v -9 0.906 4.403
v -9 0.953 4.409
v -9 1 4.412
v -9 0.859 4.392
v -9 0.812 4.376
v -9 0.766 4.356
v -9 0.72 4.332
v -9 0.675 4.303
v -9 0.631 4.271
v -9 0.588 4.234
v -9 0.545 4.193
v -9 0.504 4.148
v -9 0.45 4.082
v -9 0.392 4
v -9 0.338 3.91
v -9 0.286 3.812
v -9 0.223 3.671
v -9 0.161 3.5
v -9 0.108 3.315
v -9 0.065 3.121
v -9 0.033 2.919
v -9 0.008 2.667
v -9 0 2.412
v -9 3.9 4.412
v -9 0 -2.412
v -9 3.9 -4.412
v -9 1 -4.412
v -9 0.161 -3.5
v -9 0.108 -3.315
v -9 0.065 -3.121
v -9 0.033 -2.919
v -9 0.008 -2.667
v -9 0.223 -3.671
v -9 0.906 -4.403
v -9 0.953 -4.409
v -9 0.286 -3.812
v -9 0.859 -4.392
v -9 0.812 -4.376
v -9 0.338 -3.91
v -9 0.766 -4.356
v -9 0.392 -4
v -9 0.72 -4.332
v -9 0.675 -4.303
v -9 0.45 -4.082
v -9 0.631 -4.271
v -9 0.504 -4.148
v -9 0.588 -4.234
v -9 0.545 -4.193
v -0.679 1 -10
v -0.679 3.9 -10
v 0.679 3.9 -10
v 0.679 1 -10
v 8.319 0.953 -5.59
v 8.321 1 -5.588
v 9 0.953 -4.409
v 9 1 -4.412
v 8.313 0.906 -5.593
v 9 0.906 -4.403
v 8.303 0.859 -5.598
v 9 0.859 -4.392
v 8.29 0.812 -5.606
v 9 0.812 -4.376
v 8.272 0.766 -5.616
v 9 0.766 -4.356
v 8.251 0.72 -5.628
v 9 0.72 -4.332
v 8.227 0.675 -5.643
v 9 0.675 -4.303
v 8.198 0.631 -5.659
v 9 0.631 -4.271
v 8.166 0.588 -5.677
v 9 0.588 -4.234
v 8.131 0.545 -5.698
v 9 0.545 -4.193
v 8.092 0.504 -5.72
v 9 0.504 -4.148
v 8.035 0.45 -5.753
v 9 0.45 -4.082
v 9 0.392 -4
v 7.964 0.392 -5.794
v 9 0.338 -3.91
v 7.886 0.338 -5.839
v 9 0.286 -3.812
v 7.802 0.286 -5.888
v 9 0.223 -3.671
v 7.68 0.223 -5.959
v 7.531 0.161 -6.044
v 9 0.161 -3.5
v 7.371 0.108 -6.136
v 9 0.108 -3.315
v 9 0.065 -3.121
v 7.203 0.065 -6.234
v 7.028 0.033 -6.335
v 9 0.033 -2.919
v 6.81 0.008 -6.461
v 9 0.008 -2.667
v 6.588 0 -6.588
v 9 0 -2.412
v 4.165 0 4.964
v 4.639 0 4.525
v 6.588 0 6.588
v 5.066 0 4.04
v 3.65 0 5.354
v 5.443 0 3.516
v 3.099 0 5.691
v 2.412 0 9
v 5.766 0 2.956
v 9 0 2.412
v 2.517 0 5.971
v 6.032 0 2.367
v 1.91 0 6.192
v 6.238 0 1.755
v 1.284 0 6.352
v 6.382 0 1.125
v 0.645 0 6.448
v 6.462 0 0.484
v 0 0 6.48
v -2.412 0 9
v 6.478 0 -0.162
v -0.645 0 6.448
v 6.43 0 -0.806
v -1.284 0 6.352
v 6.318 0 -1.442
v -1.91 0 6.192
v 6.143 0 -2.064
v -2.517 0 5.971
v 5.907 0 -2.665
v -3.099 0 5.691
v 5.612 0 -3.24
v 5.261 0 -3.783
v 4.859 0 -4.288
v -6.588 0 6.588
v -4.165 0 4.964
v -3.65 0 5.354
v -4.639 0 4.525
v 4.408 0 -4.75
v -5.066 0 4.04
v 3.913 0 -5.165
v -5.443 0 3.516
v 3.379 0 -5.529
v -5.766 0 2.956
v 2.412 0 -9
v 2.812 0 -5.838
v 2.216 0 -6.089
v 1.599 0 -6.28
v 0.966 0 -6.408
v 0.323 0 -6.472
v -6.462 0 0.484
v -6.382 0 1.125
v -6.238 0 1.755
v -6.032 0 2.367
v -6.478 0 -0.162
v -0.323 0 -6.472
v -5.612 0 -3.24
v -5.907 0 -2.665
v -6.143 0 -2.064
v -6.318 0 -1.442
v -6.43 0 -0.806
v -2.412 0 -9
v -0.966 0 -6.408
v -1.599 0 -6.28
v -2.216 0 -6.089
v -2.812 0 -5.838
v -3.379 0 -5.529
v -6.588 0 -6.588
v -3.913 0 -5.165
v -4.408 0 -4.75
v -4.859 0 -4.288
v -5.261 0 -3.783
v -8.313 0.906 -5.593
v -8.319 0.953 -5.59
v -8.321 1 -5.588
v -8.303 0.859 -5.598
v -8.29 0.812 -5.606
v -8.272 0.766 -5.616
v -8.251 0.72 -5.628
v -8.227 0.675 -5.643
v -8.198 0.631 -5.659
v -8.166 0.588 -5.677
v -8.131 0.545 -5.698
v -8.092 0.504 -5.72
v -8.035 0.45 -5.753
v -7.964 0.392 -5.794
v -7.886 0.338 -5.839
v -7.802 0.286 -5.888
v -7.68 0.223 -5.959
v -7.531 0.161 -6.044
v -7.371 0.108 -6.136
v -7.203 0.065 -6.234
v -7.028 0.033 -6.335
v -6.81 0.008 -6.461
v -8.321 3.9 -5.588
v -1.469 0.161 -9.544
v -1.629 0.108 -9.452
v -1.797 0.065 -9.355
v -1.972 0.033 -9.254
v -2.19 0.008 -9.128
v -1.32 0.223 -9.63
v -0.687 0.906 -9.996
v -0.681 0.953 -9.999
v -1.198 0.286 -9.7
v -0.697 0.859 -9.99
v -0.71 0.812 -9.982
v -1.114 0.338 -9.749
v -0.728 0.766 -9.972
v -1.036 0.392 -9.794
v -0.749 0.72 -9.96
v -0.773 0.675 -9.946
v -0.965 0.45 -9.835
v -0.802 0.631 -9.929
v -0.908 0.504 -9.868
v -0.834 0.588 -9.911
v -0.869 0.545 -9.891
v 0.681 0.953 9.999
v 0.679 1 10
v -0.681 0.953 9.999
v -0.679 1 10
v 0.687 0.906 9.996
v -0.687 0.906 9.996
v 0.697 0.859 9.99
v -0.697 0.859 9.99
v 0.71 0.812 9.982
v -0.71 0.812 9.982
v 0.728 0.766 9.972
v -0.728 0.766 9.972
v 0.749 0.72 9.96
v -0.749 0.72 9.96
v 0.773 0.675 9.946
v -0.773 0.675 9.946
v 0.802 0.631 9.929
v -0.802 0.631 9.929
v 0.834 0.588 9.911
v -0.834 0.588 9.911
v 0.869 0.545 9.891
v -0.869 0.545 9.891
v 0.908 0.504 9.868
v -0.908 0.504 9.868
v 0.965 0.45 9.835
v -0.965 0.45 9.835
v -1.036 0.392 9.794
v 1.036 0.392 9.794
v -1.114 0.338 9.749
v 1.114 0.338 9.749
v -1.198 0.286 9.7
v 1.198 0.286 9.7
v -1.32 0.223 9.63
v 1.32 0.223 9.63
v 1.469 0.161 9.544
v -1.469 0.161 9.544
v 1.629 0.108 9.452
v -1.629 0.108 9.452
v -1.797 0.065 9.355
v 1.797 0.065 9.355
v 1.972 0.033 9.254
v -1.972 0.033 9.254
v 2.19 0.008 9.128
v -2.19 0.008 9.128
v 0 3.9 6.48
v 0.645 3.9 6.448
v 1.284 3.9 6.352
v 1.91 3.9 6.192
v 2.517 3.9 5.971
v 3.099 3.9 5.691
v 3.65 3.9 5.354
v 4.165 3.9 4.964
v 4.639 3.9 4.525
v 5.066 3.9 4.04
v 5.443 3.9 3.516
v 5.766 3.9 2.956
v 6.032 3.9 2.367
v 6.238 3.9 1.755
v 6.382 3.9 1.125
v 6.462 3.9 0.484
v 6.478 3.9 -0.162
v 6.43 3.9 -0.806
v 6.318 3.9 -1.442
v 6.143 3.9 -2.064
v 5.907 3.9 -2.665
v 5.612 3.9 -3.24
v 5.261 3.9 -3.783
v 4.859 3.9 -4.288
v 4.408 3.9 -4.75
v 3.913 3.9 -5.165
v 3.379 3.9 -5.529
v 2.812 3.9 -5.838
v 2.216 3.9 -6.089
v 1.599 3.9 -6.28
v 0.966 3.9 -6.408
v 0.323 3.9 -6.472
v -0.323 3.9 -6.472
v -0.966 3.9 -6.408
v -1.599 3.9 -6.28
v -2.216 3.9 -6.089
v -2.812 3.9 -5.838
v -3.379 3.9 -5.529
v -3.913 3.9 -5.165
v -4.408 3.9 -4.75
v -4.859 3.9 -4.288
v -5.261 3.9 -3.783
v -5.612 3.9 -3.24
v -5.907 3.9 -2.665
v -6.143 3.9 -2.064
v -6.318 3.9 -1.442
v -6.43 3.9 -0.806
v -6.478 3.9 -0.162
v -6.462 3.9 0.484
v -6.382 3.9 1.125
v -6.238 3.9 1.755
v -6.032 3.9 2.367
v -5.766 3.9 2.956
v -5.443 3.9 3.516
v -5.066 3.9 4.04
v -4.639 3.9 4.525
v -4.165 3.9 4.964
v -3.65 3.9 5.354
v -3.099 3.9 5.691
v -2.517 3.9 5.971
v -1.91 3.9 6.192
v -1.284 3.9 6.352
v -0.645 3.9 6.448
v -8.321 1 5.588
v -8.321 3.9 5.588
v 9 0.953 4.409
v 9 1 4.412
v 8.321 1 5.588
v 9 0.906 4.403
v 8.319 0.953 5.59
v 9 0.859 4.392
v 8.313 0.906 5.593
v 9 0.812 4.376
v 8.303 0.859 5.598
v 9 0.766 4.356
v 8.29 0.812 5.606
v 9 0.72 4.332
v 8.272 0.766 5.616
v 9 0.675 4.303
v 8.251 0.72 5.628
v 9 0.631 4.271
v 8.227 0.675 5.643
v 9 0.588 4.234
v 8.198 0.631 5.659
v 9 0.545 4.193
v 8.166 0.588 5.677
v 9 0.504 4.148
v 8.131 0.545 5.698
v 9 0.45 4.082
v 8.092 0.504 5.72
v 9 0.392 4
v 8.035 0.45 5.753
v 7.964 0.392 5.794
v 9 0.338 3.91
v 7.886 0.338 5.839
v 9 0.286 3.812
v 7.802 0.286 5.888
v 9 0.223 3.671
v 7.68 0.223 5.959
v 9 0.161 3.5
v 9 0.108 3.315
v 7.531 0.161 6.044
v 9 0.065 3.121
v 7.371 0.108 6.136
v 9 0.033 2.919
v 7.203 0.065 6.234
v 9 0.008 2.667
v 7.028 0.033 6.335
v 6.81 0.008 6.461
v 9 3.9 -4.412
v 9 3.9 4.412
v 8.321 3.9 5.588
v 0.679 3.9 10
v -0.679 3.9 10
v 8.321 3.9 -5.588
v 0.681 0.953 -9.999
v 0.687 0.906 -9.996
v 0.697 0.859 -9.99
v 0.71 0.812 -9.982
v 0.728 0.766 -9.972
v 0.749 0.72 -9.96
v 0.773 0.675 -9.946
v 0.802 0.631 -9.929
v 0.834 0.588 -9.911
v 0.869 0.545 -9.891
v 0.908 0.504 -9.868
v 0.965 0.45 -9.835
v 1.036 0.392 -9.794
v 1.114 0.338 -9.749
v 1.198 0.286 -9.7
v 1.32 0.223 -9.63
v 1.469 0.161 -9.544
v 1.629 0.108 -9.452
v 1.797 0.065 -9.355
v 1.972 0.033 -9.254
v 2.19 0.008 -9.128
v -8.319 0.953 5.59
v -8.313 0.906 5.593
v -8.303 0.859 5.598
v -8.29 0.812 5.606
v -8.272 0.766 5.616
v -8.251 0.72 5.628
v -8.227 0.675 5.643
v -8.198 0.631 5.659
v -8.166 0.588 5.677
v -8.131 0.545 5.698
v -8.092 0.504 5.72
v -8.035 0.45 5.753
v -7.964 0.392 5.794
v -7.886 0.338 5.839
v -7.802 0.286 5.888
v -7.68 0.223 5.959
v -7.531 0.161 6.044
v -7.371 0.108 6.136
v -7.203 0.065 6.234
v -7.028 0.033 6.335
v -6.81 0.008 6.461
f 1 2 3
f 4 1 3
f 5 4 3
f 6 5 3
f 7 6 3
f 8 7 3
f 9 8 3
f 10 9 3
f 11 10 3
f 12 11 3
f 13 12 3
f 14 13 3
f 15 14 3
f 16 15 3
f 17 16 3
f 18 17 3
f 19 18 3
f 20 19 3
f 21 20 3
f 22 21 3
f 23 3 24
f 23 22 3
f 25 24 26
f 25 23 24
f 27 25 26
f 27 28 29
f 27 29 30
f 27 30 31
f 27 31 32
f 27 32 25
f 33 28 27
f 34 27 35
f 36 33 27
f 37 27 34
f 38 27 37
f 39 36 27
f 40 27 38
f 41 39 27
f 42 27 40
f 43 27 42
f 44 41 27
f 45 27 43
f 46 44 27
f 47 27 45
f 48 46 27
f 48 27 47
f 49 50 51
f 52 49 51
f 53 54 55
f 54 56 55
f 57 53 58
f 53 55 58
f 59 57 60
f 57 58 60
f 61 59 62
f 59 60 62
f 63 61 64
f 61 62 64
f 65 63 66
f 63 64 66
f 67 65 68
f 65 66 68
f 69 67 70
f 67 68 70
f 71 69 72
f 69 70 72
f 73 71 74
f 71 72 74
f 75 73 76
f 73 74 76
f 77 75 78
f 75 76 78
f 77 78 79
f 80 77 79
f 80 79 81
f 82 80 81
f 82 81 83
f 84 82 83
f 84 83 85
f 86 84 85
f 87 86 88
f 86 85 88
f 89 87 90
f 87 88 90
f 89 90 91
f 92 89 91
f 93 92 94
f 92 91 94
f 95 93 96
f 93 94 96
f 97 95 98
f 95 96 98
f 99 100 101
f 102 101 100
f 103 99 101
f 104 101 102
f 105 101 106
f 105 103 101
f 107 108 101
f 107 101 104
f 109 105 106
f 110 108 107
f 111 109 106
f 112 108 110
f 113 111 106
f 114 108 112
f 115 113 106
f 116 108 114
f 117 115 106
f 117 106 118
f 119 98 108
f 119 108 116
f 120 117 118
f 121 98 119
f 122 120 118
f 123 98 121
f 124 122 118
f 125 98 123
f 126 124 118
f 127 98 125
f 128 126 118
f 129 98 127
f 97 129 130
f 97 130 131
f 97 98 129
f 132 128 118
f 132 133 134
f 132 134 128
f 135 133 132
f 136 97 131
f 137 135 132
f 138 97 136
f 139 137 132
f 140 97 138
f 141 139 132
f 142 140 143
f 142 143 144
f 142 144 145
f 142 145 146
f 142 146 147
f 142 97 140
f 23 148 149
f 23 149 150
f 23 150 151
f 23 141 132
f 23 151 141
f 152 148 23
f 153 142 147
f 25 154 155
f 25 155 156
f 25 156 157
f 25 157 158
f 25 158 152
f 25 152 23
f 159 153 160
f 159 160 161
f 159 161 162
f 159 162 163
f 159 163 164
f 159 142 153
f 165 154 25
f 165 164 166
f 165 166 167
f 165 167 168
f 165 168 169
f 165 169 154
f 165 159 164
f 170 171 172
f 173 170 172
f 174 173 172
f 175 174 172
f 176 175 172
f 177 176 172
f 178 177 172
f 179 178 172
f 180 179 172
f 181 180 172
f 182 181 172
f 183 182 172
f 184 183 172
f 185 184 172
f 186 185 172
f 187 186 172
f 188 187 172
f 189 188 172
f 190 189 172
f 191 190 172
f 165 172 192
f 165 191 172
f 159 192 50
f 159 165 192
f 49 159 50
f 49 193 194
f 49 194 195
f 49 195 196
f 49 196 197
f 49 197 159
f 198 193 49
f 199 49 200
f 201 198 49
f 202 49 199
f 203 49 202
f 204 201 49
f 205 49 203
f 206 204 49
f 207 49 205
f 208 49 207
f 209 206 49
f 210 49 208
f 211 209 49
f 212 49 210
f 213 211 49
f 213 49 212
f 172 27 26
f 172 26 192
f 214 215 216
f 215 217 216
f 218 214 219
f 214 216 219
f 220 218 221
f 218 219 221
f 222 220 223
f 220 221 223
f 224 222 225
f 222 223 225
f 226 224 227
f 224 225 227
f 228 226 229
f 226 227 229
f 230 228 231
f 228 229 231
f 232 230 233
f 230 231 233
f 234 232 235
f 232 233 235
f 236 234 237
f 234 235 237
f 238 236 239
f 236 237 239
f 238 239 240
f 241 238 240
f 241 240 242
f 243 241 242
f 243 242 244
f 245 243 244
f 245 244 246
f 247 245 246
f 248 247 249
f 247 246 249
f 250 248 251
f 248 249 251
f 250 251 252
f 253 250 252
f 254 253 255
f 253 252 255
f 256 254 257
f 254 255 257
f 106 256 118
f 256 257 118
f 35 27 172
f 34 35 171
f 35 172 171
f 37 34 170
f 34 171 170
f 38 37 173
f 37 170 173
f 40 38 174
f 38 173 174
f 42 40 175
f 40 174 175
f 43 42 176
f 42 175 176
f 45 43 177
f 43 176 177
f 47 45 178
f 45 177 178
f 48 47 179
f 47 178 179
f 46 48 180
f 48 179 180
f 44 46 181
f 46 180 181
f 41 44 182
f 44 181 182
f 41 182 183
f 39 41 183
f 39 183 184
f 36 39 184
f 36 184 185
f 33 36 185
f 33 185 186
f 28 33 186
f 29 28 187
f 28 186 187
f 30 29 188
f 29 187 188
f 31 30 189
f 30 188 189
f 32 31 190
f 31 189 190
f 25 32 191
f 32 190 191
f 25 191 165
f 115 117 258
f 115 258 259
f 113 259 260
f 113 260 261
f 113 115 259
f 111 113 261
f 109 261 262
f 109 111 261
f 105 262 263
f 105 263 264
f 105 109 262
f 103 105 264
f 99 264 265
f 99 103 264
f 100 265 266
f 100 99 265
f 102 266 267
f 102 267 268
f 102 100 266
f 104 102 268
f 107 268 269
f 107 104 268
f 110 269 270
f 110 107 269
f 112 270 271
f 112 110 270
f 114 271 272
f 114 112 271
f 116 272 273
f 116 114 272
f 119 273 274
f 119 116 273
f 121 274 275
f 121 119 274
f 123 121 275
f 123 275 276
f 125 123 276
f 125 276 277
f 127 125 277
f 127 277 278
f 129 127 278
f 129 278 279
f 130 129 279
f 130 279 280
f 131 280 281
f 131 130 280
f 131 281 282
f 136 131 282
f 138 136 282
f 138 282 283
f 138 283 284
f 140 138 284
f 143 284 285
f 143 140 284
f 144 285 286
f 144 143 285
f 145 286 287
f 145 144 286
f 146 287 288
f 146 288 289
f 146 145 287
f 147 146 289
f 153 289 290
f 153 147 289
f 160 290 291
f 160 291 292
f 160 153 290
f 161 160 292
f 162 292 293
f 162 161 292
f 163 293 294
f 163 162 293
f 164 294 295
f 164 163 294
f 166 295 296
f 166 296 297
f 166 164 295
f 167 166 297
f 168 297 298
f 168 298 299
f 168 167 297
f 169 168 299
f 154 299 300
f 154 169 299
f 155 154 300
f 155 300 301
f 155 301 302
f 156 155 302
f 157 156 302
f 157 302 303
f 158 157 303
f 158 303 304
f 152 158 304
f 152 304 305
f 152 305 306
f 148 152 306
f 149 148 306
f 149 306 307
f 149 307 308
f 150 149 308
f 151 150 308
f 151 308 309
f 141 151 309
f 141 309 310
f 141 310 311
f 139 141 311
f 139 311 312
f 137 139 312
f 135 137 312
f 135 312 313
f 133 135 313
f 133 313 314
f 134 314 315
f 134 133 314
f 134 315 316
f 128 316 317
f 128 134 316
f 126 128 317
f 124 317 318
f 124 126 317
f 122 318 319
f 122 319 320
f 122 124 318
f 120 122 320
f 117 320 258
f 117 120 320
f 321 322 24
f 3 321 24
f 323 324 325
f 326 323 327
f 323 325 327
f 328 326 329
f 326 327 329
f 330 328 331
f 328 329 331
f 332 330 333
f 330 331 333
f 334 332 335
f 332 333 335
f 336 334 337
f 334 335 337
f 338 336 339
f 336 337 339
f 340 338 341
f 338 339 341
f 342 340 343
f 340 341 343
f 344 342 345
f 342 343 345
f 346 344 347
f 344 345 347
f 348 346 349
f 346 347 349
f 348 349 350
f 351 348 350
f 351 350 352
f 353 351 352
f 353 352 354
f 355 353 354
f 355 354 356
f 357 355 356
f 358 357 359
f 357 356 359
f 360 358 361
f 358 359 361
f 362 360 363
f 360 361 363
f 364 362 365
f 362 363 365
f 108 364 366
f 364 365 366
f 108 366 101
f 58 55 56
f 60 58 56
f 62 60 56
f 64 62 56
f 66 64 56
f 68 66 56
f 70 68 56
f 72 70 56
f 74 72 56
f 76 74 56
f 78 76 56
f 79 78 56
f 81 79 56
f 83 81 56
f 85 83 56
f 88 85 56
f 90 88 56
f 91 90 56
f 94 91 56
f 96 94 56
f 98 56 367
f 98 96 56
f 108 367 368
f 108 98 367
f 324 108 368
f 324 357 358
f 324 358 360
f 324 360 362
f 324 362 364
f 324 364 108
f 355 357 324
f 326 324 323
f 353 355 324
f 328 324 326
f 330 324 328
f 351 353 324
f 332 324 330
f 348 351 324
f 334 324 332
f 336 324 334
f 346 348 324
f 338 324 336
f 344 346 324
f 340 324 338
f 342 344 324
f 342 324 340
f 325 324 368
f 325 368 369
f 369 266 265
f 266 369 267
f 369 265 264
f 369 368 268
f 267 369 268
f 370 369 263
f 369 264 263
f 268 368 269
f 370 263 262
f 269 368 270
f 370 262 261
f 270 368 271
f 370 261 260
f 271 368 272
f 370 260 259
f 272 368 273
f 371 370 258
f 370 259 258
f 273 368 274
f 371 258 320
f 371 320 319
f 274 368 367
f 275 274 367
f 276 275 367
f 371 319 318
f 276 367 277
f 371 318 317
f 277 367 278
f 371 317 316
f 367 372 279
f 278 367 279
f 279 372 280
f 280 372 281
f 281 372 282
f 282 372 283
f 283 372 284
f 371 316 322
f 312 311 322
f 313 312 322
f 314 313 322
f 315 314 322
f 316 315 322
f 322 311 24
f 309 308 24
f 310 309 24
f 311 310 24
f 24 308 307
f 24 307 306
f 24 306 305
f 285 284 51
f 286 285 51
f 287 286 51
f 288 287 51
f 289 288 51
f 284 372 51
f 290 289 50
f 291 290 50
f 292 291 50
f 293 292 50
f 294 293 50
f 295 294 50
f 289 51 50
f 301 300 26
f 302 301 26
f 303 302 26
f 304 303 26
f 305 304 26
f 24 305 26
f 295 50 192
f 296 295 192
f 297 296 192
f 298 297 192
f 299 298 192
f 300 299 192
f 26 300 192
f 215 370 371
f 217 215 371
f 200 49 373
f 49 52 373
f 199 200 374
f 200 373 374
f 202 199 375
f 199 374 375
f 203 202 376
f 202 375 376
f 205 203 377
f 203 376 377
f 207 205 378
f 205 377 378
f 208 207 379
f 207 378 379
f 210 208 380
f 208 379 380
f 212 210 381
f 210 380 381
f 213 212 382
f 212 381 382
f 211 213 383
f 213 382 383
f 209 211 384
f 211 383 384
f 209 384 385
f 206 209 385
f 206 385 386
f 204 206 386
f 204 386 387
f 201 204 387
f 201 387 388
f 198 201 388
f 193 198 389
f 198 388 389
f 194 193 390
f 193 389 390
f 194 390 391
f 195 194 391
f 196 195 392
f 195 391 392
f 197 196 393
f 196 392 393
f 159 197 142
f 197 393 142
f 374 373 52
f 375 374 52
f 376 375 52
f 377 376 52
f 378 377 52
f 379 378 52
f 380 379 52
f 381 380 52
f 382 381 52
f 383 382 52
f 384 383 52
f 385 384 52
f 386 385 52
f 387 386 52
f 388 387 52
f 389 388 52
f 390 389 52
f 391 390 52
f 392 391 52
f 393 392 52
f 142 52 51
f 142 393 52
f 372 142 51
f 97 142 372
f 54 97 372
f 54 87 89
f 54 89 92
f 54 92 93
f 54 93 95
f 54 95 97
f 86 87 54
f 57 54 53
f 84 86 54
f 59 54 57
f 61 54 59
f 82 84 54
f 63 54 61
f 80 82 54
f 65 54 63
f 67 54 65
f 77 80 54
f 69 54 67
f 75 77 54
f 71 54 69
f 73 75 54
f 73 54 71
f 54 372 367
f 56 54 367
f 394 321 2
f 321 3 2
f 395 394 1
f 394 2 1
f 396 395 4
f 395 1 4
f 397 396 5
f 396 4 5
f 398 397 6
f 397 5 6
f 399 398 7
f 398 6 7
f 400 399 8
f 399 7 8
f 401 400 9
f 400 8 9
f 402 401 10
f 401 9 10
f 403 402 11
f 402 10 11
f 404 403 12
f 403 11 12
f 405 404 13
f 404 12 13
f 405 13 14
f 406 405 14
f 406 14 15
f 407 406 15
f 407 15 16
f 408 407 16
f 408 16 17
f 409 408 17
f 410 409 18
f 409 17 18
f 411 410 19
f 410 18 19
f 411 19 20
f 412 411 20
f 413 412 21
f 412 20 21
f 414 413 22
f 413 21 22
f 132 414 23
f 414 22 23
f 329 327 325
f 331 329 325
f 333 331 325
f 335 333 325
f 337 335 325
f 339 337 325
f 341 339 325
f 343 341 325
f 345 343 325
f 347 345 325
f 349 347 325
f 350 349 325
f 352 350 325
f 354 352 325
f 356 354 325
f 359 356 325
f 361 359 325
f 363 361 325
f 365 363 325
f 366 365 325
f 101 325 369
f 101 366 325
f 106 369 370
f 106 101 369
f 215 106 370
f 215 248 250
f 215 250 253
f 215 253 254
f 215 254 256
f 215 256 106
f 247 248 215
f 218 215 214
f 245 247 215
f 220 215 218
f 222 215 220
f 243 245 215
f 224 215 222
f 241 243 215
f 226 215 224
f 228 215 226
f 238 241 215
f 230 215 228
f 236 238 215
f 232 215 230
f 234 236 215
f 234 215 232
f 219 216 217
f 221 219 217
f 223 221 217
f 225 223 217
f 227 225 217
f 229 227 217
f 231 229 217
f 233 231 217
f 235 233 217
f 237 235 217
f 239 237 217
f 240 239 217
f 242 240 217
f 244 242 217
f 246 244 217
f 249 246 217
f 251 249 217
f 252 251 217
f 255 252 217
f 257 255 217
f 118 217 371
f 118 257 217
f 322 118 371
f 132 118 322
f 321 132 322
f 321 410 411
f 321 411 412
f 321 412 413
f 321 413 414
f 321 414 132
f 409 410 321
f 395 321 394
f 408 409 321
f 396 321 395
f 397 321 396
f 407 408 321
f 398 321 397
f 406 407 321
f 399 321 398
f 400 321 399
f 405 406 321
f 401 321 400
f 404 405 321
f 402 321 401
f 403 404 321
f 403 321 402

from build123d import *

# Parameters (mm, degrees)
SKETCH_1_R      = 6.48
EXTRUDE_1_DEPTH = 3.9
FILLET_1_R      = 1


with BuildPart() as part:
    # Эскиз1 → Бобышка-Вытянуть1 (new body)
    with BuildSketch(Plane(origin=(0, 0, 0), x_dir=(1, 0, 0), z_dir=(0, 1, 0))):
        Polygon((0.679491924, 10), (8.320508076, 5.588457268), (9, 4.411542732), (9, -4.411542732), (8.320508076, -5.588457268), (0.679491924, -10), (-0.679491924, -10), (-8.320508076, -5.588457268), (-9, -4.411542732), (-9, 4.411542732), (-8.320508076, 5.588457268), (-0.679491924, 10), align=None)
        with Locations(Location((0, 0, 0), (0, 0, 270))):
            Circle(SKETCH_1_R, mode=Mode.SUBTRACT)
    extrude(amount=EXTRUDE_1_DEPTH)

    # Скругление1
    fillet_1_edges = [part.edges().sort_by_distance(p)[0] for p in [
        (-8.660254038, 0, -5),
        (0, 0, -10),
        (8.660254038, 0, -5),
        (8.660254038, 0, 5),
        (0, 0, 10),
        (-8.660254038, 0, 5),
    ]]
    fillet(fillet_1_edges, radius=FILLET_1_R)


solid = part.part
